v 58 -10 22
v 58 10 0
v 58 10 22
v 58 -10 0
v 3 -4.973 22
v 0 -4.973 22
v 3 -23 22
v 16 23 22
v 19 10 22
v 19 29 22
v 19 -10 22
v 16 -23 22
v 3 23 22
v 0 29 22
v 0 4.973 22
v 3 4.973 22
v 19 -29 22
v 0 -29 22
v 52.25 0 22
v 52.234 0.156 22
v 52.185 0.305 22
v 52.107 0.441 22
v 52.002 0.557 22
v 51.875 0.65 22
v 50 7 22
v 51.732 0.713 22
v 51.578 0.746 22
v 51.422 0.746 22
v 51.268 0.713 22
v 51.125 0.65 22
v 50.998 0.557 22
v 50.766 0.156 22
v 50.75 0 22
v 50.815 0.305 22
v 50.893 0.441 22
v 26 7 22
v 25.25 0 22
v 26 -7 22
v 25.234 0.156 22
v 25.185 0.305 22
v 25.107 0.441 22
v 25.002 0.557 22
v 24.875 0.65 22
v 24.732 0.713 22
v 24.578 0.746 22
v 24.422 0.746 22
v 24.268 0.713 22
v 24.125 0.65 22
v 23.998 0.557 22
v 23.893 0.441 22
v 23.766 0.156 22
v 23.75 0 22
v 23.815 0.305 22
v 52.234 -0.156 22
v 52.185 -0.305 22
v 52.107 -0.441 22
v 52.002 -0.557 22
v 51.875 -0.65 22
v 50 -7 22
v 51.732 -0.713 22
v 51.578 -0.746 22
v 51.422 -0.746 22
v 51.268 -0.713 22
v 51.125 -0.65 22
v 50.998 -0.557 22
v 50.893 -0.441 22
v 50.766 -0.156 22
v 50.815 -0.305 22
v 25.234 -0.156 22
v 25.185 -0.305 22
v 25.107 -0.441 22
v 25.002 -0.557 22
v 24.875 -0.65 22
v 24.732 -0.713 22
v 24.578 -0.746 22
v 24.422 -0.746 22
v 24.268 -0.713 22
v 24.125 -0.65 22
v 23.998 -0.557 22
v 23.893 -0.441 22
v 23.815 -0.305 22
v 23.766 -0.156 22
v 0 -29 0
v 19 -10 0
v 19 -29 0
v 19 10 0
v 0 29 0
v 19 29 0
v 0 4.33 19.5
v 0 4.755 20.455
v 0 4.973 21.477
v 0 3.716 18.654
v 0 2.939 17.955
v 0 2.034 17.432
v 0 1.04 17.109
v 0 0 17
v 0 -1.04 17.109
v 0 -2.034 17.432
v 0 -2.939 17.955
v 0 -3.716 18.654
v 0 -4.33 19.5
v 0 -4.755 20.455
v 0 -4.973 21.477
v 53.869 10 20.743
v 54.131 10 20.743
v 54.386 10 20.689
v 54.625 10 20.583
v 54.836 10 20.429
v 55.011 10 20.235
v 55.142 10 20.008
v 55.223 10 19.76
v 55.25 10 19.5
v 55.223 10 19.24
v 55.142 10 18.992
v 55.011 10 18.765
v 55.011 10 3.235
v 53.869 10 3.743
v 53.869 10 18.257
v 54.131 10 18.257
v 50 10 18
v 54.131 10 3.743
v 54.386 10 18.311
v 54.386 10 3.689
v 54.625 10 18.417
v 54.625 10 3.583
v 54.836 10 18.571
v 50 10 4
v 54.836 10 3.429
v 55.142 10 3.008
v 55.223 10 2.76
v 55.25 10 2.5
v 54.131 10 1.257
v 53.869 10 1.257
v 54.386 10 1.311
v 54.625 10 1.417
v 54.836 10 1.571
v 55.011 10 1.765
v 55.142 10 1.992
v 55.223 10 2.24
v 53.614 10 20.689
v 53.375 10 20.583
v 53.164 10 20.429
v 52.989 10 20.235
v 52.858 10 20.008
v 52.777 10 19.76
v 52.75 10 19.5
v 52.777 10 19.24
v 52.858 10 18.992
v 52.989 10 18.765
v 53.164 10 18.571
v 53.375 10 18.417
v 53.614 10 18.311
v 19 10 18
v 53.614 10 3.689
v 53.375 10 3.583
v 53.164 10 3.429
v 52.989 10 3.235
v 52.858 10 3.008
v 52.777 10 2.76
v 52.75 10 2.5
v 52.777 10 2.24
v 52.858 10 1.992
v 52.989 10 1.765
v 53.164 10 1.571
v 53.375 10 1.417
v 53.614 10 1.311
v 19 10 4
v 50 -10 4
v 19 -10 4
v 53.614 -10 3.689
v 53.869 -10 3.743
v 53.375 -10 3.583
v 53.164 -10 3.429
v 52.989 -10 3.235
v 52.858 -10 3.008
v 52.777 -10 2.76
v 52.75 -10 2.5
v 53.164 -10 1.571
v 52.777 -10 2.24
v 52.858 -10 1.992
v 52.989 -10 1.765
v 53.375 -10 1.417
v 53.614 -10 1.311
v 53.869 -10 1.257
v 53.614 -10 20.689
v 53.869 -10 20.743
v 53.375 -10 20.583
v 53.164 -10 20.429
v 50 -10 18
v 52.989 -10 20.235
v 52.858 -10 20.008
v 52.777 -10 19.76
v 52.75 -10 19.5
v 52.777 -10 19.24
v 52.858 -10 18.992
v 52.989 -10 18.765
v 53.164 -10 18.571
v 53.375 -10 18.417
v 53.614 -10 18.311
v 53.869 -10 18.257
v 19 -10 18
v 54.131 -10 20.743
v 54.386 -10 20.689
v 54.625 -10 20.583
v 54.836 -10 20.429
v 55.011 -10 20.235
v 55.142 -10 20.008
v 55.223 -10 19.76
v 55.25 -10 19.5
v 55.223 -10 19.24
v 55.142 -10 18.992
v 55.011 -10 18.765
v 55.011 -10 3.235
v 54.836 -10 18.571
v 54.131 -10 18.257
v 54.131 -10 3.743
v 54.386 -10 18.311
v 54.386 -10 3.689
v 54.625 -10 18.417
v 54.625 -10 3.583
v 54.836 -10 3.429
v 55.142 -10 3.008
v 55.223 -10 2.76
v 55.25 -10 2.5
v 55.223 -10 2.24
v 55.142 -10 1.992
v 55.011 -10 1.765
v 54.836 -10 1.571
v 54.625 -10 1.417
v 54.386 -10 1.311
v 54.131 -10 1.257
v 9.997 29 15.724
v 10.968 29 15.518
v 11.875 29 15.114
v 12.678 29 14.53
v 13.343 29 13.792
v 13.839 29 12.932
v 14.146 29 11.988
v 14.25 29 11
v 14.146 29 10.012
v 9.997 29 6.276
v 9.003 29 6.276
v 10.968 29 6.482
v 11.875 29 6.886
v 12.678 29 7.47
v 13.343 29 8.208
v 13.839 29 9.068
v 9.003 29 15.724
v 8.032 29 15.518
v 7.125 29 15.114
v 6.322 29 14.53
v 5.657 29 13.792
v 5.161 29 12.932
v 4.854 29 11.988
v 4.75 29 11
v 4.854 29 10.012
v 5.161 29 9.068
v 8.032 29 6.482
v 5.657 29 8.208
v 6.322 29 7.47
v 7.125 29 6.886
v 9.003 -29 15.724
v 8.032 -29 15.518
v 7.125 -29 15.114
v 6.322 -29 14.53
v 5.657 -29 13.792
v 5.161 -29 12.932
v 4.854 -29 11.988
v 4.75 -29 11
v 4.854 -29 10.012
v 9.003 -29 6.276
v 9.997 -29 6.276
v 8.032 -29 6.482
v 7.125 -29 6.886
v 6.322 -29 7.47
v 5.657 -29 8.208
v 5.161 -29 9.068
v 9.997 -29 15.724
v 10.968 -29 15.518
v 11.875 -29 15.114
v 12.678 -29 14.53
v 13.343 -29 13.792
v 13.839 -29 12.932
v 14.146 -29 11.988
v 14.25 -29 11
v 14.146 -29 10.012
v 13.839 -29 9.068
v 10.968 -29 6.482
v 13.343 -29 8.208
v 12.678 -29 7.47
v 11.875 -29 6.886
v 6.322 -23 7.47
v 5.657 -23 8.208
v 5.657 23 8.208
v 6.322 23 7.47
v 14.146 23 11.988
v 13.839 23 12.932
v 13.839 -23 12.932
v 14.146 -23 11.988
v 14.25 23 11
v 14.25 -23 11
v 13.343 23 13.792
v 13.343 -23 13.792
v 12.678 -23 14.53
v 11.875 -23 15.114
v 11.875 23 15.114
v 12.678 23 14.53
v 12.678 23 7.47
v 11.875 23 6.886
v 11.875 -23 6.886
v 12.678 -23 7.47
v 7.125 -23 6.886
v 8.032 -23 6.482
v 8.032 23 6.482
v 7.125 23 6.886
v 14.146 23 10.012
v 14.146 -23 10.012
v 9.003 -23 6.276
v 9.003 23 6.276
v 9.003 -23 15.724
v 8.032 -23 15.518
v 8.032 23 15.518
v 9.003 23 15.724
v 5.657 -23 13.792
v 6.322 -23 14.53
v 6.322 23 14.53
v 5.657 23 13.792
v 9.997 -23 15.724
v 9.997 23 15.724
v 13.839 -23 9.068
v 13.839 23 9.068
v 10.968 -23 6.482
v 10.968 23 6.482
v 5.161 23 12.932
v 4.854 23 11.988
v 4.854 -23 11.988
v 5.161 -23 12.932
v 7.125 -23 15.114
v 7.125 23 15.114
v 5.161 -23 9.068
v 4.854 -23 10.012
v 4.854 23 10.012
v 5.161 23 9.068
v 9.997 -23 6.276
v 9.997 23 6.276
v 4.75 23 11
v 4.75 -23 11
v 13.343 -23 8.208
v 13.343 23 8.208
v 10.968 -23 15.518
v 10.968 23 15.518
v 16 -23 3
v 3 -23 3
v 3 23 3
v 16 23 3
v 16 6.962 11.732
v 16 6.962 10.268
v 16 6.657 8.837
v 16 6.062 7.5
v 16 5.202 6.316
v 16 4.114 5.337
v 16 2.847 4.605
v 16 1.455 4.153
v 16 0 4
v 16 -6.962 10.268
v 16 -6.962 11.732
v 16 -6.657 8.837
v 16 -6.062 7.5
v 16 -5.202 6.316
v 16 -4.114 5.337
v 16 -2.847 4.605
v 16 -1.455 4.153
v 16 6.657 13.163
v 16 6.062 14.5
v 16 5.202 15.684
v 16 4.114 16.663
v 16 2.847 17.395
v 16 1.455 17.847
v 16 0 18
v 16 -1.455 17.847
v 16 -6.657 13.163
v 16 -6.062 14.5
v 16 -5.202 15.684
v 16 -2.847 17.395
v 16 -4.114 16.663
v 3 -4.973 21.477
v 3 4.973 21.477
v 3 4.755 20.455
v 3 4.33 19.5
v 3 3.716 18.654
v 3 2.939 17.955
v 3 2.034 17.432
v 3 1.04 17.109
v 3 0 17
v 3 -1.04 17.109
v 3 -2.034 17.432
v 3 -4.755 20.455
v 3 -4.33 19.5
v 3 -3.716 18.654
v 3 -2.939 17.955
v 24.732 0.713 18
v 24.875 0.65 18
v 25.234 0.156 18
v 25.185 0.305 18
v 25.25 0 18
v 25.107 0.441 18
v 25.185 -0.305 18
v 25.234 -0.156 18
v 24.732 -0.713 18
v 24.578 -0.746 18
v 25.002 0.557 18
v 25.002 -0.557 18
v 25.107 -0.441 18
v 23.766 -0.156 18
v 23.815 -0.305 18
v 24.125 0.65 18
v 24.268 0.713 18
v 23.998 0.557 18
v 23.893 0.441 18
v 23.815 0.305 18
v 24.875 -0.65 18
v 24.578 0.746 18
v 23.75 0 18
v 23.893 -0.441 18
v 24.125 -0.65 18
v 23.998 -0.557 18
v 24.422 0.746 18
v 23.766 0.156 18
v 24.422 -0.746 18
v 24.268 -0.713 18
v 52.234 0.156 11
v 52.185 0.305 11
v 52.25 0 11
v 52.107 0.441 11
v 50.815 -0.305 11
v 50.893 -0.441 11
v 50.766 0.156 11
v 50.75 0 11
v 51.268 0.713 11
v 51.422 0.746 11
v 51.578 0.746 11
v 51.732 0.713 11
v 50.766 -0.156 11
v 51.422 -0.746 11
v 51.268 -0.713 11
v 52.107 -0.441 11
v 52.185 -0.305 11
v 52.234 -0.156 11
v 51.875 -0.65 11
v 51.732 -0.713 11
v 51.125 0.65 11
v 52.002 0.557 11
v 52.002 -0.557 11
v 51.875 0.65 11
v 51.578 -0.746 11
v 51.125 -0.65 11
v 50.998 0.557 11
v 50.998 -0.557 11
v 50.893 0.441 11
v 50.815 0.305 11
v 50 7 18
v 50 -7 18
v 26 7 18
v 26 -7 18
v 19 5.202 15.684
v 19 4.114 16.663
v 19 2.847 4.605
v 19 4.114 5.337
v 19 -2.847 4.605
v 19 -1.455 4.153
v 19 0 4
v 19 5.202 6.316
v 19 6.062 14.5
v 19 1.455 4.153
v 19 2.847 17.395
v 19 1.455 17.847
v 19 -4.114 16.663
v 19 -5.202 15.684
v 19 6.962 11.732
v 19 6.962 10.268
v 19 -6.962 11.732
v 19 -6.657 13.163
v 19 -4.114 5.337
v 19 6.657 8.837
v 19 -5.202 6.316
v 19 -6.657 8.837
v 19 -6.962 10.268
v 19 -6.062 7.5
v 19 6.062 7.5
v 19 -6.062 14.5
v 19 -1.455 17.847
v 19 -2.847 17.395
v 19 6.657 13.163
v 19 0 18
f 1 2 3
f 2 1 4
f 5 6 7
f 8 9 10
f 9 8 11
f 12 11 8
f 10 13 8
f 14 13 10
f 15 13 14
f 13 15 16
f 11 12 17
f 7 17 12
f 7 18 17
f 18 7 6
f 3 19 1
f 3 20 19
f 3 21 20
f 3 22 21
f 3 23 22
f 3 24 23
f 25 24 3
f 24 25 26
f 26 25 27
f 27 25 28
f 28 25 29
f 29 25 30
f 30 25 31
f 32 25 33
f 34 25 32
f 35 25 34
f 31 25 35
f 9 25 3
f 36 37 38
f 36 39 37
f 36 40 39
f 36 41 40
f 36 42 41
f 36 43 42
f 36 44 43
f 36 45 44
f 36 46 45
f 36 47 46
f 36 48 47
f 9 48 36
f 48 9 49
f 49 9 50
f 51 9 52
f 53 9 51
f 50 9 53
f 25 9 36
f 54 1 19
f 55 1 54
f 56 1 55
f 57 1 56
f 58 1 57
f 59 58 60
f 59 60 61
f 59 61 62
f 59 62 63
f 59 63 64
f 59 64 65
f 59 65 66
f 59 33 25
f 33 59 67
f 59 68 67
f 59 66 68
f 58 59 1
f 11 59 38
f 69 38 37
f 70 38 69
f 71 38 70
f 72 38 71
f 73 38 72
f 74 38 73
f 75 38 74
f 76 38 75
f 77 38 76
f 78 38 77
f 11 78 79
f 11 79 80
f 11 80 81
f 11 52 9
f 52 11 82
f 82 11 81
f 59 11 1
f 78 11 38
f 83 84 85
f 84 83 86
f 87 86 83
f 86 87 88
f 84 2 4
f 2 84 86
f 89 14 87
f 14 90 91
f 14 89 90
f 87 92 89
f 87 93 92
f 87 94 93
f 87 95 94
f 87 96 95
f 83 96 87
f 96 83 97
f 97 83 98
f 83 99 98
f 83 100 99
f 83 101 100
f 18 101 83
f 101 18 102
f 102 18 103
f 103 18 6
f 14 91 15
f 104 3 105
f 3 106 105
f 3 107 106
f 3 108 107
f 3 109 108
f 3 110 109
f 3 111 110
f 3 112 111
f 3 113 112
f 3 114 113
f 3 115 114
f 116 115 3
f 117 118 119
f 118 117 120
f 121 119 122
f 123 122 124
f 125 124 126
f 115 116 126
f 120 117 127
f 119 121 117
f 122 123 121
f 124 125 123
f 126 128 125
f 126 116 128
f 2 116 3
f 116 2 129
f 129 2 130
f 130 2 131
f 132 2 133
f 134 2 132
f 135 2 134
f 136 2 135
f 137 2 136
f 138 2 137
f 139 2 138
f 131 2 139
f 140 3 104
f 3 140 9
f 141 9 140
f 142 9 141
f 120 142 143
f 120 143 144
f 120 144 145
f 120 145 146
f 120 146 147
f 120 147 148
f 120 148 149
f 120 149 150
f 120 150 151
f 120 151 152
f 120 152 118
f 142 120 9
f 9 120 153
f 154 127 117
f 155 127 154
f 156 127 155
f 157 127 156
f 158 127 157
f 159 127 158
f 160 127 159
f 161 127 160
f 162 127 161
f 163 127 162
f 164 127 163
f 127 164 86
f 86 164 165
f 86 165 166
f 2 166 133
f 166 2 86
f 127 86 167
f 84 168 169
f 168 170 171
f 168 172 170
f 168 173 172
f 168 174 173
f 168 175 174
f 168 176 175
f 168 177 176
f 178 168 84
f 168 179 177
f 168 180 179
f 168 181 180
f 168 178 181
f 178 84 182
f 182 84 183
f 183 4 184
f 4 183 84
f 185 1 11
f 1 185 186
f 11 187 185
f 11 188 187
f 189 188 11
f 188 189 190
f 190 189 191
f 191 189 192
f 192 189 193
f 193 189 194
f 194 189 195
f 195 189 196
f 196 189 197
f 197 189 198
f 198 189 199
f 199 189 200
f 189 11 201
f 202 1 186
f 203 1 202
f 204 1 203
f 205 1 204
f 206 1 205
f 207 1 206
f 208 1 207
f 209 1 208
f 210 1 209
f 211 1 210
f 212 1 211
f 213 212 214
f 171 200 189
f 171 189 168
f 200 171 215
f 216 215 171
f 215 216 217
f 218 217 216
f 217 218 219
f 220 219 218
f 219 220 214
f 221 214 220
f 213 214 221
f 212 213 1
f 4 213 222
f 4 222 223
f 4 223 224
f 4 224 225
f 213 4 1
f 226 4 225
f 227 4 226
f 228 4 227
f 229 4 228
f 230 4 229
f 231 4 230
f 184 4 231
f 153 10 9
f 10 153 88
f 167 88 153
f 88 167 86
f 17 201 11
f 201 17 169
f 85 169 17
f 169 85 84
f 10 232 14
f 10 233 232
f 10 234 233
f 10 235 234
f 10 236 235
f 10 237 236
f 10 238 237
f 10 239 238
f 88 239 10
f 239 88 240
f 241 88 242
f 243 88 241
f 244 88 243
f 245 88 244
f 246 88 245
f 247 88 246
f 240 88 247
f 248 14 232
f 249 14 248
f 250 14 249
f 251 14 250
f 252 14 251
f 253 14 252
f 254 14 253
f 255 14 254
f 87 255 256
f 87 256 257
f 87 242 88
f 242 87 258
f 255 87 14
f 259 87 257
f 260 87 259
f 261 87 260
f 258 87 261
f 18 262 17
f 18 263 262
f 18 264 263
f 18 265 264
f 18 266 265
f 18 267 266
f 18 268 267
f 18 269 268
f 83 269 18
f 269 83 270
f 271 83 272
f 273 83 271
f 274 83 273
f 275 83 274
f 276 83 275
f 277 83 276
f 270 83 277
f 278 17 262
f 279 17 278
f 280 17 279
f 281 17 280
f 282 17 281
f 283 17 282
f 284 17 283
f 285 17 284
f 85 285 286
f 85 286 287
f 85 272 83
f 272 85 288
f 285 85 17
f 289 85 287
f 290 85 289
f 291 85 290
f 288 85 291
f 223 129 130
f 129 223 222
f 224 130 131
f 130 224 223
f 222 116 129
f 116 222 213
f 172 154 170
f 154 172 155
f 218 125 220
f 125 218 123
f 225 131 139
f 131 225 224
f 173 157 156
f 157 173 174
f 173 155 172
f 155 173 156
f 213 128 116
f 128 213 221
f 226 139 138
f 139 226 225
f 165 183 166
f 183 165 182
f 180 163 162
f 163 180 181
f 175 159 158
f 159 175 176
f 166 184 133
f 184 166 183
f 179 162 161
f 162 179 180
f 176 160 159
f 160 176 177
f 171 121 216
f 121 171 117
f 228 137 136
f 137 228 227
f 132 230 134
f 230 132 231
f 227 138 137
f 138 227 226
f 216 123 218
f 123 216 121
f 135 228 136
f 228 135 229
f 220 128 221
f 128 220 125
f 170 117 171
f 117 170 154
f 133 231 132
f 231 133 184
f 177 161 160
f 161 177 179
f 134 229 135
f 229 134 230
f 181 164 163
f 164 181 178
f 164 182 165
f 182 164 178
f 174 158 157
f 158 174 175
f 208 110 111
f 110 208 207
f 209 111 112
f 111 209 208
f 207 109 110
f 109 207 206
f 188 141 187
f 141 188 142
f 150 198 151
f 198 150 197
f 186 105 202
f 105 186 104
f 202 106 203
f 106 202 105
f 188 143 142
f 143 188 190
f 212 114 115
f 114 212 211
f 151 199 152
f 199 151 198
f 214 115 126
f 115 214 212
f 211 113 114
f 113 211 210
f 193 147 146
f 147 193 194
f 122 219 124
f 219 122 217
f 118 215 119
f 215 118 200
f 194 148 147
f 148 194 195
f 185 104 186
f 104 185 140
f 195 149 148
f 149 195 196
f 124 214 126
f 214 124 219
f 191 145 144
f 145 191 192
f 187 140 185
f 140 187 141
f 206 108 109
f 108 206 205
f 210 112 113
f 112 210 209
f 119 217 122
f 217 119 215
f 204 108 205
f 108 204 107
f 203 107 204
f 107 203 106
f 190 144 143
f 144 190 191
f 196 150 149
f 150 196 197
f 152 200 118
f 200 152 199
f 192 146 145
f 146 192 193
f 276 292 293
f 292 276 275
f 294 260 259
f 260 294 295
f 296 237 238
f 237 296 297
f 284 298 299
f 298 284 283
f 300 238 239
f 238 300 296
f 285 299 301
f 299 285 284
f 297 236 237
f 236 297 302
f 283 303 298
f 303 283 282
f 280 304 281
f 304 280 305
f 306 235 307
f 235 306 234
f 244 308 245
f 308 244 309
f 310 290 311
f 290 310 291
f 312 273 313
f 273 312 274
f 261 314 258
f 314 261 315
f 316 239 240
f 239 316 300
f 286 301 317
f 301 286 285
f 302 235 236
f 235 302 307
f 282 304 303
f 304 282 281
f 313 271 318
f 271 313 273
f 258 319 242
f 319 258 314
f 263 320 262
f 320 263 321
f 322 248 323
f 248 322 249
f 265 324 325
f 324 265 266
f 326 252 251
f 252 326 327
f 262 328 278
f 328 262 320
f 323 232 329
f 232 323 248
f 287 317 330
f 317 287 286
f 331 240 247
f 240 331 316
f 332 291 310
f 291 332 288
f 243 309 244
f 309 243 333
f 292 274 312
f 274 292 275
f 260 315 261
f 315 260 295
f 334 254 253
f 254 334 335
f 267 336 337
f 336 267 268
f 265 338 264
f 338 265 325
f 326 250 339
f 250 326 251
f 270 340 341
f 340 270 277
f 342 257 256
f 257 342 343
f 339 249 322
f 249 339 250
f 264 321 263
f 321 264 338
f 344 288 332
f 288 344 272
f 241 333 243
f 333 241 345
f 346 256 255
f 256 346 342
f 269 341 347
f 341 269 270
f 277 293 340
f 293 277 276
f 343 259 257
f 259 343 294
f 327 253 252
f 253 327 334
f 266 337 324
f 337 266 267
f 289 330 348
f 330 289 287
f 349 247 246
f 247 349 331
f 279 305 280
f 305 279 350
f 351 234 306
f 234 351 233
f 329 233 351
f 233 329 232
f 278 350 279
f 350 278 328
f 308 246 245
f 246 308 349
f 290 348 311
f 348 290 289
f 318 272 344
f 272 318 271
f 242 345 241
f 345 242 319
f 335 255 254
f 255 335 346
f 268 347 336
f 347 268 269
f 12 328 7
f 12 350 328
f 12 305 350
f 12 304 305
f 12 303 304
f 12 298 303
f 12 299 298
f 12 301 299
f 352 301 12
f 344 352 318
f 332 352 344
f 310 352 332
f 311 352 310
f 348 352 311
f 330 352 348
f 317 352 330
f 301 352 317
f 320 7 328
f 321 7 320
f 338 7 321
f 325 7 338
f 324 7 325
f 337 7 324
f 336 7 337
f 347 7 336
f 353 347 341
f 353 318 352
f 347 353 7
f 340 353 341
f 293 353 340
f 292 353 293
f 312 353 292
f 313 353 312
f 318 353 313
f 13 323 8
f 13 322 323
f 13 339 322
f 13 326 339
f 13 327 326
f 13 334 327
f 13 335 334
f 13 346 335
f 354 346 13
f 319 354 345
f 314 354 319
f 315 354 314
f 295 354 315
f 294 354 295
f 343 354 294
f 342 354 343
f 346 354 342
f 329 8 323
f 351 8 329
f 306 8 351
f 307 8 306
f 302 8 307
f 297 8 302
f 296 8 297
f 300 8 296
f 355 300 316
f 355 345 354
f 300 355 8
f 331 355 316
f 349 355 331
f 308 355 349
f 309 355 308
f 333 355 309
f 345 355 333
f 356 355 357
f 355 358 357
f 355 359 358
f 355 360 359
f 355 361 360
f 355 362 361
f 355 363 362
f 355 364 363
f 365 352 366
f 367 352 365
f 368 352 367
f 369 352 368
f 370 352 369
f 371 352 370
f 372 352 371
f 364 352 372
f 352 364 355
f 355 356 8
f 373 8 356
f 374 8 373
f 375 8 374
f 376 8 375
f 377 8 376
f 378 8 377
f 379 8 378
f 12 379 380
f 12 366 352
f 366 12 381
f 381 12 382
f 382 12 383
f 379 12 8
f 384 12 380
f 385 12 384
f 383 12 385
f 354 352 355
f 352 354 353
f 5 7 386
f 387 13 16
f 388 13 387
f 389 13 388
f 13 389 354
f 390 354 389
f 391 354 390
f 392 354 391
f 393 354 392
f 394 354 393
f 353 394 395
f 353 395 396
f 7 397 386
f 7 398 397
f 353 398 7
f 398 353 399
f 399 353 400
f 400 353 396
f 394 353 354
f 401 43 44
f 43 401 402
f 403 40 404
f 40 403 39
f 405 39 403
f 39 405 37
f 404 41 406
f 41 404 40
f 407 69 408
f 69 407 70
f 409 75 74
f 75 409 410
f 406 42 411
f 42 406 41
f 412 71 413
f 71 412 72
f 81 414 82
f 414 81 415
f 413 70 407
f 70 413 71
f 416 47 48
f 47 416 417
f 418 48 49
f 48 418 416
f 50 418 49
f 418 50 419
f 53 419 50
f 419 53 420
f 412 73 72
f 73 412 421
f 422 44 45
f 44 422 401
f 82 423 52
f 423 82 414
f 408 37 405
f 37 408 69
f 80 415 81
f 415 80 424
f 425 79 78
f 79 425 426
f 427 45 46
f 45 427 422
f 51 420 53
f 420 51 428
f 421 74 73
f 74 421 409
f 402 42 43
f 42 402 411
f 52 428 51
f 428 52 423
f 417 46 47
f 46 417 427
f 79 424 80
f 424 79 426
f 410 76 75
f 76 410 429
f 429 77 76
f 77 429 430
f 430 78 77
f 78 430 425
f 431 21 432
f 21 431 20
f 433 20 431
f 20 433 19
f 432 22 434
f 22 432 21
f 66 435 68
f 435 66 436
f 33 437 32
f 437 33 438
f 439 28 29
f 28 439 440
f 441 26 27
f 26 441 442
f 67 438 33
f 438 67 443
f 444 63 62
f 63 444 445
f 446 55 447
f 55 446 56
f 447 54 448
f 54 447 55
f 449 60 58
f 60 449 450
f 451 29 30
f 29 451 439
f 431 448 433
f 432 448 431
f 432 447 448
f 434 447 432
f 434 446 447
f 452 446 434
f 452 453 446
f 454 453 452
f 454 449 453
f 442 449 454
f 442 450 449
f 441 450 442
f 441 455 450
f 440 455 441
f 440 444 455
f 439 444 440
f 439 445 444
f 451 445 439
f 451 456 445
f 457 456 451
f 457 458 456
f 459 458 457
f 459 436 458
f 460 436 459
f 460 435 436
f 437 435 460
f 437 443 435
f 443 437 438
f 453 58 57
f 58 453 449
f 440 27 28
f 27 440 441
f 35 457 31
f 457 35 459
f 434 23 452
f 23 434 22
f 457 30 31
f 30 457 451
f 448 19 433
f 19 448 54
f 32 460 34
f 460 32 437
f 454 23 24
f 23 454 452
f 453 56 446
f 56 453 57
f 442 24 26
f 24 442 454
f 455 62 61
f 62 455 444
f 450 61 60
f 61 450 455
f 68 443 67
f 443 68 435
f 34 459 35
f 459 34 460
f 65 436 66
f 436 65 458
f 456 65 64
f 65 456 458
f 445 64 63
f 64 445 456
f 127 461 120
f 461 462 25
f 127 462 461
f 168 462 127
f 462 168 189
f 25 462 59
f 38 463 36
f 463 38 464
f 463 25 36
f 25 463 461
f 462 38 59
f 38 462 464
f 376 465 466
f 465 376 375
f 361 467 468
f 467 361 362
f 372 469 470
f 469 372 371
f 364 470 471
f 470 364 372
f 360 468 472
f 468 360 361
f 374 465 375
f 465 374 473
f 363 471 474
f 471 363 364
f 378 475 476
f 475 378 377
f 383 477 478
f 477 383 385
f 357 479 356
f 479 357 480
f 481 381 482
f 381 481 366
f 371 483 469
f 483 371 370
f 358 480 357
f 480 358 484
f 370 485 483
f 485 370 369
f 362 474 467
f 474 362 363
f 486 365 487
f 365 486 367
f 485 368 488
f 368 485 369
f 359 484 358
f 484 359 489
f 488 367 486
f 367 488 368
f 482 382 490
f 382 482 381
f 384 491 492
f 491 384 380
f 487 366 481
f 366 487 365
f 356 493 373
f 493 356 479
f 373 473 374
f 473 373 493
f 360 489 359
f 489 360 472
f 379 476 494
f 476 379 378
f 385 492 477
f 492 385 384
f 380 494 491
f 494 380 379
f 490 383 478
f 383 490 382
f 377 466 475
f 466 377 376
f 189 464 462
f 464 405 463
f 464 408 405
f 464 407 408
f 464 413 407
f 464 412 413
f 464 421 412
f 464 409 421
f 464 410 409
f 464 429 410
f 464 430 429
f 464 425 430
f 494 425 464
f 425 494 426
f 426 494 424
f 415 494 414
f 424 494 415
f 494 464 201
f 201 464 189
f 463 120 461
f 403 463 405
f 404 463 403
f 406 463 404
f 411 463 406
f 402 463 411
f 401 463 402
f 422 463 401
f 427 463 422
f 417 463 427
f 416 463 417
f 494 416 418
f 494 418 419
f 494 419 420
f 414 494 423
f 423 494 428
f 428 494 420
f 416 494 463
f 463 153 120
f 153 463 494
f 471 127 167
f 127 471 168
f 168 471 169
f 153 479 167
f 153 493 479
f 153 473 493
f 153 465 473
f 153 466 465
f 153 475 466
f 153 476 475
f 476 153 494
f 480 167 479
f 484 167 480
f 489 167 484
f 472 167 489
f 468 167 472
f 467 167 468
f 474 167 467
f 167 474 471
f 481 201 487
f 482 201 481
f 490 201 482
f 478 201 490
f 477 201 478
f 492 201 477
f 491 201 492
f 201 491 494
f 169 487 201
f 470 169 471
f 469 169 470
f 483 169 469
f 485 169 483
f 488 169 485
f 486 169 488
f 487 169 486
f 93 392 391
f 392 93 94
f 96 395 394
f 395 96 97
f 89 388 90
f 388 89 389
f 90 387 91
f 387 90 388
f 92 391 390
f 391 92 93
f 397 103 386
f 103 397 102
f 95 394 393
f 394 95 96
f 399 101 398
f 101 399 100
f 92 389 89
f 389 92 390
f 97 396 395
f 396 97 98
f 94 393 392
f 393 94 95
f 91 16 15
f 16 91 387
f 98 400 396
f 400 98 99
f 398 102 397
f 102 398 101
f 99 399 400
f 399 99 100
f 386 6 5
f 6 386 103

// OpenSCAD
GEARBOX_WIDTH = 19;
GEARBOX_HEIGHT = 22;
GEARBOX_MOUNT_DIA = 2.5;
GEARBOX_MOUNT_SPACING = 17;
GEARBOX_MOUNT_OFFSET = 4;

FRAME_LENGTH = 58;
FRAME_MIDDLE_WIDTH = 20;
FRAME_AXLE_WIDTH = 19;
FRAME_WIDTH  = FRAME_MIDDLE_WIDTH + 2 * GEARBOX_WIDTH ;
FRAME_HEIGHT = GEARBOX_HEIGHT;

SLOT_WIDTH = 14;
SLOT_OFFSET = 8;
SLOT_LENGTH = FRAME_LENGTH - FRAME_AXLE_WIDTH - SLOT_OFFSET;

BEARING_DIA = 9.5;
BEARING_THICKNESS = 6;

WALL_THICKNESS = 3;
MIDDLE_CHANNEL_WIDTH = FRAME_MIDDLE_WIDTH - 2 * WALL_THICKNESS;
AXLE_CHANNEL_WIDTH = FRAME_AXLE_WIDTH - 2 * WALL_THICKNESS;

SERVO_WIDTH = 24;
SERVO_MOUNT_DIA = 1.5;
SERVO_MOUNT_SPACING = 27;
SERVO_MOUNT_OFFSET = 6.5;

THETHER_DIA = 10;

$fn = 30;

module gearbox_mount() {
  rotate([90, 0, 0])
  for(i = [-1, 1]) {
    translate([0, i * GEARBOX_MOUNT_SPACING/2, 0])
    cylinder(d = GEARBOX_MOUNT_DIA, h = FRAME_MIDDLE_WIDTH, center = true);
  }
}

module frame() {
   union() {
    translate([0, -FRAME_MIDDLE_WIDTH/2, 0])
    cube(size = [FRAME_LENGTH, FRAME_MIDDLE_WIDTH, FRAME_HEIGHT]);
    
    translate([0, -FRAME_WIDTH/2, 0])
    cube(size = [FRAME_AXLE_WIDTH, FRAME_WIDTH, FRAME_HEIGHT]);
  }
}

module axle_mount() {
  l = FRAME_WIDTH - 2 * BEARING_THICKNESS;
  rotate([90, 0, 0]) {
    cylinder(d = BEARING_DIA, h = FRAME_WIDTH, center = true);
    cylinder(d = AXLE_CHANNEL_WIDTH, h = l, center = true); 
  }
  translate([0, 0, WALL_THICKNESS])
  cube(size = [AXLE_CHANNEL_WIDTH, l, FRAME_HEIGHT], center = true);
}

module middle_channel() {
  translate([WALL_THICKNESS, 0, FRAME_HEIGHT/2])
  rotate([0, 90, 0])
  cylinder(d = MIDDLE_CHANNEL_WIDTH, h = FRAME_LENGTH - FRAME_AXLE_WIDTH - WALL_THICKNESS, center = true);
}

module slot() {
  cube(size = [SLOT_LENGTH, FRAME_MIDDLE_WIDTH, SLOT_WIDTH], center = true);
}

module servo_mount() {
  for(i = [-1, 1]) {
    translate([i * SERVO_MOUNT_SPACING/2, 0, 0])
    cylinder(d = SERVO_MOUNT_DIA, h = FRAME_HEIGHT, center = true);
  }
  
  cube(size = [SERVO_WIDTH, MIDDLE_CHANNEL_WIDTH, FRAME_HEIGHT], center = true);
}

module thether() {
  rotate([0, 90, 0])
  cylinder(d = THETHER_DIA, h = WALL_THICKNESS * 2, center = true);
}

module front_axle() {
  difference() {
    frame();
    
    #translate([FRAME_LENGTH - GEARBOX_MOUNT_OFFSET, 0, FRAME_HEIGHT/2])
    gearbox_mount();
    
    #translate([FRAME_AXLE_WIDTH/2, 0, FRAME_HEIGHT/2])
    axle_mount();
    
    #translate([FRAME_AXLE_WIDTH, 0, 0])
    middle_channel();
    
    #translate([FRAME_LENGTH - SLOT_OFFSET - SLOT_LENGTH/2, 0, FRAME_HEIGHT/2])
    slot();
    
    #translate([FRAME_LENGTH - SERVO_MOUNT_SPACING/2 - SERVO_MOUNT_OFFSET, 0, FRAME_HEIGHT])
    servo_mount();
    
    #translate([0, 0, FRAME_HEIGHT])
    thether();
  }
}

front_axle();
